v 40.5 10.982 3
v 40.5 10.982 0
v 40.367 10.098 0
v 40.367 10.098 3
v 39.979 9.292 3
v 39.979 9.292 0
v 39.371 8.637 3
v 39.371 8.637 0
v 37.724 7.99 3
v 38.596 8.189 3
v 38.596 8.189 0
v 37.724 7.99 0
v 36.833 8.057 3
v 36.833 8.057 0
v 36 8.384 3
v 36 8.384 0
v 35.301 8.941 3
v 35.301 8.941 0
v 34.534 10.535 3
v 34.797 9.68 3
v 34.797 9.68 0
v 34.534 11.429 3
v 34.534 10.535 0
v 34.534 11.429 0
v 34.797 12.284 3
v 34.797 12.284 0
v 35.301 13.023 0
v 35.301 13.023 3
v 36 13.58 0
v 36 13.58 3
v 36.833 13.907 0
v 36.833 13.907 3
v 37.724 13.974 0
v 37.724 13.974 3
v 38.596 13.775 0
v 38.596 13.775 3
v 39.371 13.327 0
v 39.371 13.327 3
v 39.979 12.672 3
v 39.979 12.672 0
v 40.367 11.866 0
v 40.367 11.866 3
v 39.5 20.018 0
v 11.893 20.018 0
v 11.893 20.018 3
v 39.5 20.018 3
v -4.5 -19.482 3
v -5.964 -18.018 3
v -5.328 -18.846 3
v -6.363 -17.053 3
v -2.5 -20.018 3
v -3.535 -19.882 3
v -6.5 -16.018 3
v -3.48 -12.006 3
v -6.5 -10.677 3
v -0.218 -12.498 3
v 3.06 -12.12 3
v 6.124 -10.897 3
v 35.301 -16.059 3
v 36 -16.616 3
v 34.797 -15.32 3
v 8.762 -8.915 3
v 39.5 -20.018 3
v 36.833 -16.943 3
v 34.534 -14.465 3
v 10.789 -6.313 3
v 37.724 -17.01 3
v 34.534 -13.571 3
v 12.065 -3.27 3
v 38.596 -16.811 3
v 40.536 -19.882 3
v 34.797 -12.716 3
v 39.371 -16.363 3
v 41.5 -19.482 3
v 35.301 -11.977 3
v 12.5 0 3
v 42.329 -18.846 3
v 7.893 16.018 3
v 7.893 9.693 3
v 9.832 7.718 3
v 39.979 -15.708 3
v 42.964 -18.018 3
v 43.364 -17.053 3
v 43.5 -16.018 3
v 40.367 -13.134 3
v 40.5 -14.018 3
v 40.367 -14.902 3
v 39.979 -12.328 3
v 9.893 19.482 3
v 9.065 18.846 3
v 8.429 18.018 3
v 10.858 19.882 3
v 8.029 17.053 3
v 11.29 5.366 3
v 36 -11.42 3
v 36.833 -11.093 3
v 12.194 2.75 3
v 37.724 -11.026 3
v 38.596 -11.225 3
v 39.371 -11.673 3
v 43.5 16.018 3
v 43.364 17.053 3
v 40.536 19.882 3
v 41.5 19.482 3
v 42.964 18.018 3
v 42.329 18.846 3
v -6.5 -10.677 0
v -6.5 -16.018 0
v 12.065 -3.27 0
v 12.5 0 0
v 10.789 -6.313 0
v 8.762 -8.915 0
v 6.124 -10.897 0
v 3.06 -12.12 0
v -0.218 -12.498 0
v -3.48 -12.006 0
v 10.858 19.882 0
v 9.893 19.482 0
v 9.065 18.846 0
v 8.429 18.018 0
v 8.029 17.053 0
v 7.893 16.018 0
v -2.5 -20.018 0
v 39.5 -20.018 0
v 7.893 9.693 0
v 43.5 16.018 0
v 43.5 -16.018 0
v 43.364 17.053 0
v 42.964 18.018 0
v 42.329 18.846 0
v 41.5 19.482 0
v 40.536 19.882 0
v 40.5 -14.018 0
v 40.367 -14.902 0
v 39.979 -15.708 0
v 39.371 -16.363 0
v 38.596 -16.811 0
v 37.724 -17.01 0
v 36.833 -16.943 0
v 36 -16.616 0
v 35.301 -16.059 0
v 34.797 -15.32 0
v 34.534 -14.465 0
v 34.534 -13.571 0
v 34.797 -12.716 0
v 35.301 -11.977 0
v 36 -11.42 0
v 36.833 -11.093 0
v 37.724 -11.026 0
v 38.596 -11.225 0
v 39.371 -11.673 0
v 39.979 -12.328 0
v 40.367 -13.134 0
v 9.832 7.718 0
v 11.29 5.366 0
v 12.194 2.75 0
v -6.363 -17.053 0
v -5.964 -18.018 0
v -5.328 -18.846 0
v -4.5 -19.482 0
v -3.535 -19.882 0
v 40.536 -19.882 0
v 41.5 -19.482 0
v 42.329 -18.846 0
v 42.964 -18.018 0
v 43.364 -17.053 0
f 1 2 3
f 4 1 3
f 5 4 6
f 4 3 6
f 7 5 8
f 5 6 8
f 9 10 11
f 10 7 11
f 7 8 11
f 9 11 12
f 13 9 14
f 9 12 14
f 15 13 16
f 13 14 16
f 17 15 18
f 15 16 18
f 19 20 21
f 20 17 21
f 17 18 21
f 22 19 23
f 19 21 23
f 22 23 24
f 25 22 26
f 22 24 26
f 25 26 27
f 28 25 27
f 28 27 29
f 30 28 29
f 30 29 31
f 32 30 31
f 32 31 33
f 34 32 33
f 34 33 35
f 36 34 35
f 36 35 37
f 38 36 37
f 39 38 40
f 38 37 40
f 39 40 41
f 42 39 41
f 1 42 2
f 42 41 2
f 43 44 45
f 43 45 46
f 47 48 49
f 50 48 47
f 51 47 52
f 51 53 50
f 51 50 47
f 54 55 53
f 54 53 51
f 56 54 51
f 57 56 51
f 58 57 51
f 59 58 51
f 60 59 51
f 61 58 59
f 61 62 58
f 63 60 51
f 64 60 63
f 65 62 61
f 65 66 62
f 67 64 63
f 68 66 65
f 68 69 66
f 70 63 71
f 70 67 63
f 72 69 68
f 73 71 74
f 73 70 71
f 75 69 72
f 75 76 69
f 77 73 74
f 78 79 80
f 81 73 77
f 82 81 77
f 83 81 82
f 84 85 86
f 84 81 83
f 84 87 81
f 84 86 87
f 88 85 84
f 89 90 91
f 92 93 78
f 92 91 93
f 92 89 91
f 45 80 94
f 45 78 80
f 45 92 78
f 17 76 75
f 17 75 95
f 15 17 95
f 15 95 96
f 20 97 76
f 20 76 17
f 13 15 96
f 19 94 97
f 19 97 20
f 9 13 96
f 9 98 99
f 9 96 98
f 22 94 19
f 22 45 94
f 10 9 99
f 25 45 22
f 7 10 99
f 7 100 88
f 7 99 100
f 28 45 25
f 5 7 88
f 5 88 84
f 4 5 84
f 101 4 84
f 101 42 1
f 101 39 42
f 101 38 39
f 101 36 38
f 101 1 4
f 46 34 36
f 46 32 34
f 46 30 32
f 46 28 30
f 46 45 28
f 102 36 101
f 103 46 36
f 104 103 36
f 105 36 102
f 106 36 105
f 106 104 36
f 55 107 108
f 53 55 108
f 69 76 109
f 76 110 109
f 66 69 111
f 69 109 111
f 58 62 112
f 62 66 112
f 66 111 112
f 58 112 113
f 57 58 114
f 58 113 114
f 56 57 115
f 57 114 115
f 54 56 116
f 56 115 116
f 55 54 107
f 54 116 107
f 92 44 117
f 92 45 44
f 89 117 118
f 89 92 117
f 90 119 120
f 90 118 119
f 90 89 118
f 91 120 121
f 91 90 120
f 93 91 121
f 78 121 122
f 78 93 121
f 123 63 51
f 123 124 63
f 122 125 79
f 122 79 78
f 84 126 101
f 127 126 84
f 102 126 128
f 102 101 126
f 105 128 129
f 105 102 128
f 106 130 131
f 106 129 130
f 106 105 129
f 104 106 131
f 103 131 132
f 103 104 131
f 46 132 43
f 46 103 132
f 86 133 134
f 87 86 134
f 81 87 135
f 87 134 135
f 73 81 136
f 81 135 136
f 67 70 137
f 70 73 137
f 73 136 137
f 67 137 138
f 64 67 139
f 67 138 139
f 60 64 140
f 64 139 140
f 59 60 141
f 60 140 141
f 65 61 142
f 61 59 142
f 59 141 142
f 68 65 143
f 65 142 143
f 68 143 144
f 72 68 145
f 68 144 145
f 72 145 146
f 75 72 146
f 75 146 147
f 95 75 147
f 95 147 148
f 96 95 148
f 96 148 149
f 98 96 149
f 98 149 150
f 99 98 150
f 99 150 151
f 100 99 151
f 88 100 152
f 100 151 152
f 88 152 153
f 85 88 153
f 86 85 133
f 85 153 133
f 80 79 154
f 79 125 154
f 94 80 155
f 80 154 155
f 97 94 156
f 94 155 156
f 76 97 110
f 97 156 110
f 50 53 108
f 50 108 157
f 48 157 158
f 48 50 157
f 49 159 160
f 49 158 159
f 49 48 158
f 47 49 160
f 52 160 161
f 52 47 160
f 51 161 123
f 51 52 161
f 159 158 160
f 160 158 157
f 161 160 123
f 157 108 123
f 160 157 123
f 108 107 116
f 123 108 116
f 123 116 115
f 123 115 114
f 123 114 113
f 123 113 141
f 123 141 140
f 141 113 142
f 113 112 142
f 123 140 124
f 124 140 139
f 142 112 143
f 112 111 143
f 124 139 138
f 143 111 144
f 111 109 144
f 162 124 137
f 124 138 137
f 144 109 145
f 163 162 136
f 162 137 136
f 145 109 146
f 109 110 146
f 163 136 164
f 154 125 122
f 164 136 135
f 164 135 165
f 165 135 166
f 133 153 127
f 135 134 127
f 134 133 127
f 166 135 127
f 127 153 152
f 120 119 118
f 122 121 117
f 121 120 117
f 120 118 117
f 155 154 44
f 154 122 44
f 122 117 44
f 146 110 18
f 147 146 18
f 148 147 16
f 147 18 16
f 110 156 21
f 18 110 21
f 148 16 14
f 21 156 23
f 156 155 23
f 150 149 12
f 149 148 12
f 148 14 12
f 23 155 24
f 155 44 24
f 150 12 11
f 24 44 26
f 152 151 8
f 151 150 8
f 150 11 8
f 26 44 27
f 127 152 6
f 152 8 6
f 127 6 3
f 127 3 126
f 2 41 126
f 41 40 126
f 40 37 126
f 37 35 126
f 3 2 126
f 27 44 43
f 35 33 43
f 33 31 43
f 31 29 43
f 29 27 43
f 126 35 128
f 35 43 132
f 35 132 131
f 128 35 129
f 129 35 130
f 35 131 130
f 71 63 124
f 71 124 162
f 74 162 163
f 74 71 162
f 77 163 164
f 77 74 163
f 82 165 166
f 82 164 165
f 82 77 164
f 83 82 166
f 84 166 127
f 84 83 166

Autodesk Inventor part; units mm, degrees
ref_plane "YZ Plane" through (0, 0, 0) normal (1, 0, 0) x (0, 1, 0)
ref_plane "XZ Plane" through (0, 0, 0) normal (0, 1, 0) x (-1, 0, 0)
ref_plane "XY Plane" through (0, 0, 0) normal (0, 0, 1) x (1, 0, 0)
sketch "Sketch1" plane through (0, 0, 0) normal (0, 0, 1) x (1, 0, 0)
  circle A0 centre (0, 0) radius 12.5
  line L0 (-43.5003, 20.018) -> (43.5003, 20.018)
  line L1 (43.5003, 20.018) -> (43.5003, -20.018)
  line L2 (43.5003, -20.018) -> (-43.5003, -20.018)
  line L3 (-43.5003, -20.018) -> (-43.5003, 20.018) construction
  line L4 (-43.5003, 20.018) -> (43.5003, -20.018) construction
  line L5 (43.5003, 20.018) -> (-43.5003, -20.018) construction
  line L6 (7.8932, 9.6927) -> (7.8932, 20.018)
  line L7 (-6.4997, -10.6772) -> (-6.4997, -20.018)
  circle A1 centre (37.5003, 10.982) radius 3.5 construction
  circle A2 centre (37.5003, -14.018) radius 3.5 construction
  circle A3 centre (37.5003, 10.982) radius 3
  circle A4 centre (37.5003, -14.018) radius 3
  dimension "d0" = 25
  dimension "d6" = 50
  dimension "d7" = 6
  dimension "d8" = 6
  dimension "d9" = 6
  dimension "d10" = 6
extrude "Extrusion1" add sketch "Sketch1" along normal blind 3 contours A0 L6 L0 L1 L2 L7
fillet "Fillet1" radius 4 4 edges at (43.5003, -20.018, 1.5) (43.5003, 20.018, 1.5) (-6.4997, -20.018, 1.5) (7.8932, 20.018, 1.5)
properties part number "domePlaceSingle"
